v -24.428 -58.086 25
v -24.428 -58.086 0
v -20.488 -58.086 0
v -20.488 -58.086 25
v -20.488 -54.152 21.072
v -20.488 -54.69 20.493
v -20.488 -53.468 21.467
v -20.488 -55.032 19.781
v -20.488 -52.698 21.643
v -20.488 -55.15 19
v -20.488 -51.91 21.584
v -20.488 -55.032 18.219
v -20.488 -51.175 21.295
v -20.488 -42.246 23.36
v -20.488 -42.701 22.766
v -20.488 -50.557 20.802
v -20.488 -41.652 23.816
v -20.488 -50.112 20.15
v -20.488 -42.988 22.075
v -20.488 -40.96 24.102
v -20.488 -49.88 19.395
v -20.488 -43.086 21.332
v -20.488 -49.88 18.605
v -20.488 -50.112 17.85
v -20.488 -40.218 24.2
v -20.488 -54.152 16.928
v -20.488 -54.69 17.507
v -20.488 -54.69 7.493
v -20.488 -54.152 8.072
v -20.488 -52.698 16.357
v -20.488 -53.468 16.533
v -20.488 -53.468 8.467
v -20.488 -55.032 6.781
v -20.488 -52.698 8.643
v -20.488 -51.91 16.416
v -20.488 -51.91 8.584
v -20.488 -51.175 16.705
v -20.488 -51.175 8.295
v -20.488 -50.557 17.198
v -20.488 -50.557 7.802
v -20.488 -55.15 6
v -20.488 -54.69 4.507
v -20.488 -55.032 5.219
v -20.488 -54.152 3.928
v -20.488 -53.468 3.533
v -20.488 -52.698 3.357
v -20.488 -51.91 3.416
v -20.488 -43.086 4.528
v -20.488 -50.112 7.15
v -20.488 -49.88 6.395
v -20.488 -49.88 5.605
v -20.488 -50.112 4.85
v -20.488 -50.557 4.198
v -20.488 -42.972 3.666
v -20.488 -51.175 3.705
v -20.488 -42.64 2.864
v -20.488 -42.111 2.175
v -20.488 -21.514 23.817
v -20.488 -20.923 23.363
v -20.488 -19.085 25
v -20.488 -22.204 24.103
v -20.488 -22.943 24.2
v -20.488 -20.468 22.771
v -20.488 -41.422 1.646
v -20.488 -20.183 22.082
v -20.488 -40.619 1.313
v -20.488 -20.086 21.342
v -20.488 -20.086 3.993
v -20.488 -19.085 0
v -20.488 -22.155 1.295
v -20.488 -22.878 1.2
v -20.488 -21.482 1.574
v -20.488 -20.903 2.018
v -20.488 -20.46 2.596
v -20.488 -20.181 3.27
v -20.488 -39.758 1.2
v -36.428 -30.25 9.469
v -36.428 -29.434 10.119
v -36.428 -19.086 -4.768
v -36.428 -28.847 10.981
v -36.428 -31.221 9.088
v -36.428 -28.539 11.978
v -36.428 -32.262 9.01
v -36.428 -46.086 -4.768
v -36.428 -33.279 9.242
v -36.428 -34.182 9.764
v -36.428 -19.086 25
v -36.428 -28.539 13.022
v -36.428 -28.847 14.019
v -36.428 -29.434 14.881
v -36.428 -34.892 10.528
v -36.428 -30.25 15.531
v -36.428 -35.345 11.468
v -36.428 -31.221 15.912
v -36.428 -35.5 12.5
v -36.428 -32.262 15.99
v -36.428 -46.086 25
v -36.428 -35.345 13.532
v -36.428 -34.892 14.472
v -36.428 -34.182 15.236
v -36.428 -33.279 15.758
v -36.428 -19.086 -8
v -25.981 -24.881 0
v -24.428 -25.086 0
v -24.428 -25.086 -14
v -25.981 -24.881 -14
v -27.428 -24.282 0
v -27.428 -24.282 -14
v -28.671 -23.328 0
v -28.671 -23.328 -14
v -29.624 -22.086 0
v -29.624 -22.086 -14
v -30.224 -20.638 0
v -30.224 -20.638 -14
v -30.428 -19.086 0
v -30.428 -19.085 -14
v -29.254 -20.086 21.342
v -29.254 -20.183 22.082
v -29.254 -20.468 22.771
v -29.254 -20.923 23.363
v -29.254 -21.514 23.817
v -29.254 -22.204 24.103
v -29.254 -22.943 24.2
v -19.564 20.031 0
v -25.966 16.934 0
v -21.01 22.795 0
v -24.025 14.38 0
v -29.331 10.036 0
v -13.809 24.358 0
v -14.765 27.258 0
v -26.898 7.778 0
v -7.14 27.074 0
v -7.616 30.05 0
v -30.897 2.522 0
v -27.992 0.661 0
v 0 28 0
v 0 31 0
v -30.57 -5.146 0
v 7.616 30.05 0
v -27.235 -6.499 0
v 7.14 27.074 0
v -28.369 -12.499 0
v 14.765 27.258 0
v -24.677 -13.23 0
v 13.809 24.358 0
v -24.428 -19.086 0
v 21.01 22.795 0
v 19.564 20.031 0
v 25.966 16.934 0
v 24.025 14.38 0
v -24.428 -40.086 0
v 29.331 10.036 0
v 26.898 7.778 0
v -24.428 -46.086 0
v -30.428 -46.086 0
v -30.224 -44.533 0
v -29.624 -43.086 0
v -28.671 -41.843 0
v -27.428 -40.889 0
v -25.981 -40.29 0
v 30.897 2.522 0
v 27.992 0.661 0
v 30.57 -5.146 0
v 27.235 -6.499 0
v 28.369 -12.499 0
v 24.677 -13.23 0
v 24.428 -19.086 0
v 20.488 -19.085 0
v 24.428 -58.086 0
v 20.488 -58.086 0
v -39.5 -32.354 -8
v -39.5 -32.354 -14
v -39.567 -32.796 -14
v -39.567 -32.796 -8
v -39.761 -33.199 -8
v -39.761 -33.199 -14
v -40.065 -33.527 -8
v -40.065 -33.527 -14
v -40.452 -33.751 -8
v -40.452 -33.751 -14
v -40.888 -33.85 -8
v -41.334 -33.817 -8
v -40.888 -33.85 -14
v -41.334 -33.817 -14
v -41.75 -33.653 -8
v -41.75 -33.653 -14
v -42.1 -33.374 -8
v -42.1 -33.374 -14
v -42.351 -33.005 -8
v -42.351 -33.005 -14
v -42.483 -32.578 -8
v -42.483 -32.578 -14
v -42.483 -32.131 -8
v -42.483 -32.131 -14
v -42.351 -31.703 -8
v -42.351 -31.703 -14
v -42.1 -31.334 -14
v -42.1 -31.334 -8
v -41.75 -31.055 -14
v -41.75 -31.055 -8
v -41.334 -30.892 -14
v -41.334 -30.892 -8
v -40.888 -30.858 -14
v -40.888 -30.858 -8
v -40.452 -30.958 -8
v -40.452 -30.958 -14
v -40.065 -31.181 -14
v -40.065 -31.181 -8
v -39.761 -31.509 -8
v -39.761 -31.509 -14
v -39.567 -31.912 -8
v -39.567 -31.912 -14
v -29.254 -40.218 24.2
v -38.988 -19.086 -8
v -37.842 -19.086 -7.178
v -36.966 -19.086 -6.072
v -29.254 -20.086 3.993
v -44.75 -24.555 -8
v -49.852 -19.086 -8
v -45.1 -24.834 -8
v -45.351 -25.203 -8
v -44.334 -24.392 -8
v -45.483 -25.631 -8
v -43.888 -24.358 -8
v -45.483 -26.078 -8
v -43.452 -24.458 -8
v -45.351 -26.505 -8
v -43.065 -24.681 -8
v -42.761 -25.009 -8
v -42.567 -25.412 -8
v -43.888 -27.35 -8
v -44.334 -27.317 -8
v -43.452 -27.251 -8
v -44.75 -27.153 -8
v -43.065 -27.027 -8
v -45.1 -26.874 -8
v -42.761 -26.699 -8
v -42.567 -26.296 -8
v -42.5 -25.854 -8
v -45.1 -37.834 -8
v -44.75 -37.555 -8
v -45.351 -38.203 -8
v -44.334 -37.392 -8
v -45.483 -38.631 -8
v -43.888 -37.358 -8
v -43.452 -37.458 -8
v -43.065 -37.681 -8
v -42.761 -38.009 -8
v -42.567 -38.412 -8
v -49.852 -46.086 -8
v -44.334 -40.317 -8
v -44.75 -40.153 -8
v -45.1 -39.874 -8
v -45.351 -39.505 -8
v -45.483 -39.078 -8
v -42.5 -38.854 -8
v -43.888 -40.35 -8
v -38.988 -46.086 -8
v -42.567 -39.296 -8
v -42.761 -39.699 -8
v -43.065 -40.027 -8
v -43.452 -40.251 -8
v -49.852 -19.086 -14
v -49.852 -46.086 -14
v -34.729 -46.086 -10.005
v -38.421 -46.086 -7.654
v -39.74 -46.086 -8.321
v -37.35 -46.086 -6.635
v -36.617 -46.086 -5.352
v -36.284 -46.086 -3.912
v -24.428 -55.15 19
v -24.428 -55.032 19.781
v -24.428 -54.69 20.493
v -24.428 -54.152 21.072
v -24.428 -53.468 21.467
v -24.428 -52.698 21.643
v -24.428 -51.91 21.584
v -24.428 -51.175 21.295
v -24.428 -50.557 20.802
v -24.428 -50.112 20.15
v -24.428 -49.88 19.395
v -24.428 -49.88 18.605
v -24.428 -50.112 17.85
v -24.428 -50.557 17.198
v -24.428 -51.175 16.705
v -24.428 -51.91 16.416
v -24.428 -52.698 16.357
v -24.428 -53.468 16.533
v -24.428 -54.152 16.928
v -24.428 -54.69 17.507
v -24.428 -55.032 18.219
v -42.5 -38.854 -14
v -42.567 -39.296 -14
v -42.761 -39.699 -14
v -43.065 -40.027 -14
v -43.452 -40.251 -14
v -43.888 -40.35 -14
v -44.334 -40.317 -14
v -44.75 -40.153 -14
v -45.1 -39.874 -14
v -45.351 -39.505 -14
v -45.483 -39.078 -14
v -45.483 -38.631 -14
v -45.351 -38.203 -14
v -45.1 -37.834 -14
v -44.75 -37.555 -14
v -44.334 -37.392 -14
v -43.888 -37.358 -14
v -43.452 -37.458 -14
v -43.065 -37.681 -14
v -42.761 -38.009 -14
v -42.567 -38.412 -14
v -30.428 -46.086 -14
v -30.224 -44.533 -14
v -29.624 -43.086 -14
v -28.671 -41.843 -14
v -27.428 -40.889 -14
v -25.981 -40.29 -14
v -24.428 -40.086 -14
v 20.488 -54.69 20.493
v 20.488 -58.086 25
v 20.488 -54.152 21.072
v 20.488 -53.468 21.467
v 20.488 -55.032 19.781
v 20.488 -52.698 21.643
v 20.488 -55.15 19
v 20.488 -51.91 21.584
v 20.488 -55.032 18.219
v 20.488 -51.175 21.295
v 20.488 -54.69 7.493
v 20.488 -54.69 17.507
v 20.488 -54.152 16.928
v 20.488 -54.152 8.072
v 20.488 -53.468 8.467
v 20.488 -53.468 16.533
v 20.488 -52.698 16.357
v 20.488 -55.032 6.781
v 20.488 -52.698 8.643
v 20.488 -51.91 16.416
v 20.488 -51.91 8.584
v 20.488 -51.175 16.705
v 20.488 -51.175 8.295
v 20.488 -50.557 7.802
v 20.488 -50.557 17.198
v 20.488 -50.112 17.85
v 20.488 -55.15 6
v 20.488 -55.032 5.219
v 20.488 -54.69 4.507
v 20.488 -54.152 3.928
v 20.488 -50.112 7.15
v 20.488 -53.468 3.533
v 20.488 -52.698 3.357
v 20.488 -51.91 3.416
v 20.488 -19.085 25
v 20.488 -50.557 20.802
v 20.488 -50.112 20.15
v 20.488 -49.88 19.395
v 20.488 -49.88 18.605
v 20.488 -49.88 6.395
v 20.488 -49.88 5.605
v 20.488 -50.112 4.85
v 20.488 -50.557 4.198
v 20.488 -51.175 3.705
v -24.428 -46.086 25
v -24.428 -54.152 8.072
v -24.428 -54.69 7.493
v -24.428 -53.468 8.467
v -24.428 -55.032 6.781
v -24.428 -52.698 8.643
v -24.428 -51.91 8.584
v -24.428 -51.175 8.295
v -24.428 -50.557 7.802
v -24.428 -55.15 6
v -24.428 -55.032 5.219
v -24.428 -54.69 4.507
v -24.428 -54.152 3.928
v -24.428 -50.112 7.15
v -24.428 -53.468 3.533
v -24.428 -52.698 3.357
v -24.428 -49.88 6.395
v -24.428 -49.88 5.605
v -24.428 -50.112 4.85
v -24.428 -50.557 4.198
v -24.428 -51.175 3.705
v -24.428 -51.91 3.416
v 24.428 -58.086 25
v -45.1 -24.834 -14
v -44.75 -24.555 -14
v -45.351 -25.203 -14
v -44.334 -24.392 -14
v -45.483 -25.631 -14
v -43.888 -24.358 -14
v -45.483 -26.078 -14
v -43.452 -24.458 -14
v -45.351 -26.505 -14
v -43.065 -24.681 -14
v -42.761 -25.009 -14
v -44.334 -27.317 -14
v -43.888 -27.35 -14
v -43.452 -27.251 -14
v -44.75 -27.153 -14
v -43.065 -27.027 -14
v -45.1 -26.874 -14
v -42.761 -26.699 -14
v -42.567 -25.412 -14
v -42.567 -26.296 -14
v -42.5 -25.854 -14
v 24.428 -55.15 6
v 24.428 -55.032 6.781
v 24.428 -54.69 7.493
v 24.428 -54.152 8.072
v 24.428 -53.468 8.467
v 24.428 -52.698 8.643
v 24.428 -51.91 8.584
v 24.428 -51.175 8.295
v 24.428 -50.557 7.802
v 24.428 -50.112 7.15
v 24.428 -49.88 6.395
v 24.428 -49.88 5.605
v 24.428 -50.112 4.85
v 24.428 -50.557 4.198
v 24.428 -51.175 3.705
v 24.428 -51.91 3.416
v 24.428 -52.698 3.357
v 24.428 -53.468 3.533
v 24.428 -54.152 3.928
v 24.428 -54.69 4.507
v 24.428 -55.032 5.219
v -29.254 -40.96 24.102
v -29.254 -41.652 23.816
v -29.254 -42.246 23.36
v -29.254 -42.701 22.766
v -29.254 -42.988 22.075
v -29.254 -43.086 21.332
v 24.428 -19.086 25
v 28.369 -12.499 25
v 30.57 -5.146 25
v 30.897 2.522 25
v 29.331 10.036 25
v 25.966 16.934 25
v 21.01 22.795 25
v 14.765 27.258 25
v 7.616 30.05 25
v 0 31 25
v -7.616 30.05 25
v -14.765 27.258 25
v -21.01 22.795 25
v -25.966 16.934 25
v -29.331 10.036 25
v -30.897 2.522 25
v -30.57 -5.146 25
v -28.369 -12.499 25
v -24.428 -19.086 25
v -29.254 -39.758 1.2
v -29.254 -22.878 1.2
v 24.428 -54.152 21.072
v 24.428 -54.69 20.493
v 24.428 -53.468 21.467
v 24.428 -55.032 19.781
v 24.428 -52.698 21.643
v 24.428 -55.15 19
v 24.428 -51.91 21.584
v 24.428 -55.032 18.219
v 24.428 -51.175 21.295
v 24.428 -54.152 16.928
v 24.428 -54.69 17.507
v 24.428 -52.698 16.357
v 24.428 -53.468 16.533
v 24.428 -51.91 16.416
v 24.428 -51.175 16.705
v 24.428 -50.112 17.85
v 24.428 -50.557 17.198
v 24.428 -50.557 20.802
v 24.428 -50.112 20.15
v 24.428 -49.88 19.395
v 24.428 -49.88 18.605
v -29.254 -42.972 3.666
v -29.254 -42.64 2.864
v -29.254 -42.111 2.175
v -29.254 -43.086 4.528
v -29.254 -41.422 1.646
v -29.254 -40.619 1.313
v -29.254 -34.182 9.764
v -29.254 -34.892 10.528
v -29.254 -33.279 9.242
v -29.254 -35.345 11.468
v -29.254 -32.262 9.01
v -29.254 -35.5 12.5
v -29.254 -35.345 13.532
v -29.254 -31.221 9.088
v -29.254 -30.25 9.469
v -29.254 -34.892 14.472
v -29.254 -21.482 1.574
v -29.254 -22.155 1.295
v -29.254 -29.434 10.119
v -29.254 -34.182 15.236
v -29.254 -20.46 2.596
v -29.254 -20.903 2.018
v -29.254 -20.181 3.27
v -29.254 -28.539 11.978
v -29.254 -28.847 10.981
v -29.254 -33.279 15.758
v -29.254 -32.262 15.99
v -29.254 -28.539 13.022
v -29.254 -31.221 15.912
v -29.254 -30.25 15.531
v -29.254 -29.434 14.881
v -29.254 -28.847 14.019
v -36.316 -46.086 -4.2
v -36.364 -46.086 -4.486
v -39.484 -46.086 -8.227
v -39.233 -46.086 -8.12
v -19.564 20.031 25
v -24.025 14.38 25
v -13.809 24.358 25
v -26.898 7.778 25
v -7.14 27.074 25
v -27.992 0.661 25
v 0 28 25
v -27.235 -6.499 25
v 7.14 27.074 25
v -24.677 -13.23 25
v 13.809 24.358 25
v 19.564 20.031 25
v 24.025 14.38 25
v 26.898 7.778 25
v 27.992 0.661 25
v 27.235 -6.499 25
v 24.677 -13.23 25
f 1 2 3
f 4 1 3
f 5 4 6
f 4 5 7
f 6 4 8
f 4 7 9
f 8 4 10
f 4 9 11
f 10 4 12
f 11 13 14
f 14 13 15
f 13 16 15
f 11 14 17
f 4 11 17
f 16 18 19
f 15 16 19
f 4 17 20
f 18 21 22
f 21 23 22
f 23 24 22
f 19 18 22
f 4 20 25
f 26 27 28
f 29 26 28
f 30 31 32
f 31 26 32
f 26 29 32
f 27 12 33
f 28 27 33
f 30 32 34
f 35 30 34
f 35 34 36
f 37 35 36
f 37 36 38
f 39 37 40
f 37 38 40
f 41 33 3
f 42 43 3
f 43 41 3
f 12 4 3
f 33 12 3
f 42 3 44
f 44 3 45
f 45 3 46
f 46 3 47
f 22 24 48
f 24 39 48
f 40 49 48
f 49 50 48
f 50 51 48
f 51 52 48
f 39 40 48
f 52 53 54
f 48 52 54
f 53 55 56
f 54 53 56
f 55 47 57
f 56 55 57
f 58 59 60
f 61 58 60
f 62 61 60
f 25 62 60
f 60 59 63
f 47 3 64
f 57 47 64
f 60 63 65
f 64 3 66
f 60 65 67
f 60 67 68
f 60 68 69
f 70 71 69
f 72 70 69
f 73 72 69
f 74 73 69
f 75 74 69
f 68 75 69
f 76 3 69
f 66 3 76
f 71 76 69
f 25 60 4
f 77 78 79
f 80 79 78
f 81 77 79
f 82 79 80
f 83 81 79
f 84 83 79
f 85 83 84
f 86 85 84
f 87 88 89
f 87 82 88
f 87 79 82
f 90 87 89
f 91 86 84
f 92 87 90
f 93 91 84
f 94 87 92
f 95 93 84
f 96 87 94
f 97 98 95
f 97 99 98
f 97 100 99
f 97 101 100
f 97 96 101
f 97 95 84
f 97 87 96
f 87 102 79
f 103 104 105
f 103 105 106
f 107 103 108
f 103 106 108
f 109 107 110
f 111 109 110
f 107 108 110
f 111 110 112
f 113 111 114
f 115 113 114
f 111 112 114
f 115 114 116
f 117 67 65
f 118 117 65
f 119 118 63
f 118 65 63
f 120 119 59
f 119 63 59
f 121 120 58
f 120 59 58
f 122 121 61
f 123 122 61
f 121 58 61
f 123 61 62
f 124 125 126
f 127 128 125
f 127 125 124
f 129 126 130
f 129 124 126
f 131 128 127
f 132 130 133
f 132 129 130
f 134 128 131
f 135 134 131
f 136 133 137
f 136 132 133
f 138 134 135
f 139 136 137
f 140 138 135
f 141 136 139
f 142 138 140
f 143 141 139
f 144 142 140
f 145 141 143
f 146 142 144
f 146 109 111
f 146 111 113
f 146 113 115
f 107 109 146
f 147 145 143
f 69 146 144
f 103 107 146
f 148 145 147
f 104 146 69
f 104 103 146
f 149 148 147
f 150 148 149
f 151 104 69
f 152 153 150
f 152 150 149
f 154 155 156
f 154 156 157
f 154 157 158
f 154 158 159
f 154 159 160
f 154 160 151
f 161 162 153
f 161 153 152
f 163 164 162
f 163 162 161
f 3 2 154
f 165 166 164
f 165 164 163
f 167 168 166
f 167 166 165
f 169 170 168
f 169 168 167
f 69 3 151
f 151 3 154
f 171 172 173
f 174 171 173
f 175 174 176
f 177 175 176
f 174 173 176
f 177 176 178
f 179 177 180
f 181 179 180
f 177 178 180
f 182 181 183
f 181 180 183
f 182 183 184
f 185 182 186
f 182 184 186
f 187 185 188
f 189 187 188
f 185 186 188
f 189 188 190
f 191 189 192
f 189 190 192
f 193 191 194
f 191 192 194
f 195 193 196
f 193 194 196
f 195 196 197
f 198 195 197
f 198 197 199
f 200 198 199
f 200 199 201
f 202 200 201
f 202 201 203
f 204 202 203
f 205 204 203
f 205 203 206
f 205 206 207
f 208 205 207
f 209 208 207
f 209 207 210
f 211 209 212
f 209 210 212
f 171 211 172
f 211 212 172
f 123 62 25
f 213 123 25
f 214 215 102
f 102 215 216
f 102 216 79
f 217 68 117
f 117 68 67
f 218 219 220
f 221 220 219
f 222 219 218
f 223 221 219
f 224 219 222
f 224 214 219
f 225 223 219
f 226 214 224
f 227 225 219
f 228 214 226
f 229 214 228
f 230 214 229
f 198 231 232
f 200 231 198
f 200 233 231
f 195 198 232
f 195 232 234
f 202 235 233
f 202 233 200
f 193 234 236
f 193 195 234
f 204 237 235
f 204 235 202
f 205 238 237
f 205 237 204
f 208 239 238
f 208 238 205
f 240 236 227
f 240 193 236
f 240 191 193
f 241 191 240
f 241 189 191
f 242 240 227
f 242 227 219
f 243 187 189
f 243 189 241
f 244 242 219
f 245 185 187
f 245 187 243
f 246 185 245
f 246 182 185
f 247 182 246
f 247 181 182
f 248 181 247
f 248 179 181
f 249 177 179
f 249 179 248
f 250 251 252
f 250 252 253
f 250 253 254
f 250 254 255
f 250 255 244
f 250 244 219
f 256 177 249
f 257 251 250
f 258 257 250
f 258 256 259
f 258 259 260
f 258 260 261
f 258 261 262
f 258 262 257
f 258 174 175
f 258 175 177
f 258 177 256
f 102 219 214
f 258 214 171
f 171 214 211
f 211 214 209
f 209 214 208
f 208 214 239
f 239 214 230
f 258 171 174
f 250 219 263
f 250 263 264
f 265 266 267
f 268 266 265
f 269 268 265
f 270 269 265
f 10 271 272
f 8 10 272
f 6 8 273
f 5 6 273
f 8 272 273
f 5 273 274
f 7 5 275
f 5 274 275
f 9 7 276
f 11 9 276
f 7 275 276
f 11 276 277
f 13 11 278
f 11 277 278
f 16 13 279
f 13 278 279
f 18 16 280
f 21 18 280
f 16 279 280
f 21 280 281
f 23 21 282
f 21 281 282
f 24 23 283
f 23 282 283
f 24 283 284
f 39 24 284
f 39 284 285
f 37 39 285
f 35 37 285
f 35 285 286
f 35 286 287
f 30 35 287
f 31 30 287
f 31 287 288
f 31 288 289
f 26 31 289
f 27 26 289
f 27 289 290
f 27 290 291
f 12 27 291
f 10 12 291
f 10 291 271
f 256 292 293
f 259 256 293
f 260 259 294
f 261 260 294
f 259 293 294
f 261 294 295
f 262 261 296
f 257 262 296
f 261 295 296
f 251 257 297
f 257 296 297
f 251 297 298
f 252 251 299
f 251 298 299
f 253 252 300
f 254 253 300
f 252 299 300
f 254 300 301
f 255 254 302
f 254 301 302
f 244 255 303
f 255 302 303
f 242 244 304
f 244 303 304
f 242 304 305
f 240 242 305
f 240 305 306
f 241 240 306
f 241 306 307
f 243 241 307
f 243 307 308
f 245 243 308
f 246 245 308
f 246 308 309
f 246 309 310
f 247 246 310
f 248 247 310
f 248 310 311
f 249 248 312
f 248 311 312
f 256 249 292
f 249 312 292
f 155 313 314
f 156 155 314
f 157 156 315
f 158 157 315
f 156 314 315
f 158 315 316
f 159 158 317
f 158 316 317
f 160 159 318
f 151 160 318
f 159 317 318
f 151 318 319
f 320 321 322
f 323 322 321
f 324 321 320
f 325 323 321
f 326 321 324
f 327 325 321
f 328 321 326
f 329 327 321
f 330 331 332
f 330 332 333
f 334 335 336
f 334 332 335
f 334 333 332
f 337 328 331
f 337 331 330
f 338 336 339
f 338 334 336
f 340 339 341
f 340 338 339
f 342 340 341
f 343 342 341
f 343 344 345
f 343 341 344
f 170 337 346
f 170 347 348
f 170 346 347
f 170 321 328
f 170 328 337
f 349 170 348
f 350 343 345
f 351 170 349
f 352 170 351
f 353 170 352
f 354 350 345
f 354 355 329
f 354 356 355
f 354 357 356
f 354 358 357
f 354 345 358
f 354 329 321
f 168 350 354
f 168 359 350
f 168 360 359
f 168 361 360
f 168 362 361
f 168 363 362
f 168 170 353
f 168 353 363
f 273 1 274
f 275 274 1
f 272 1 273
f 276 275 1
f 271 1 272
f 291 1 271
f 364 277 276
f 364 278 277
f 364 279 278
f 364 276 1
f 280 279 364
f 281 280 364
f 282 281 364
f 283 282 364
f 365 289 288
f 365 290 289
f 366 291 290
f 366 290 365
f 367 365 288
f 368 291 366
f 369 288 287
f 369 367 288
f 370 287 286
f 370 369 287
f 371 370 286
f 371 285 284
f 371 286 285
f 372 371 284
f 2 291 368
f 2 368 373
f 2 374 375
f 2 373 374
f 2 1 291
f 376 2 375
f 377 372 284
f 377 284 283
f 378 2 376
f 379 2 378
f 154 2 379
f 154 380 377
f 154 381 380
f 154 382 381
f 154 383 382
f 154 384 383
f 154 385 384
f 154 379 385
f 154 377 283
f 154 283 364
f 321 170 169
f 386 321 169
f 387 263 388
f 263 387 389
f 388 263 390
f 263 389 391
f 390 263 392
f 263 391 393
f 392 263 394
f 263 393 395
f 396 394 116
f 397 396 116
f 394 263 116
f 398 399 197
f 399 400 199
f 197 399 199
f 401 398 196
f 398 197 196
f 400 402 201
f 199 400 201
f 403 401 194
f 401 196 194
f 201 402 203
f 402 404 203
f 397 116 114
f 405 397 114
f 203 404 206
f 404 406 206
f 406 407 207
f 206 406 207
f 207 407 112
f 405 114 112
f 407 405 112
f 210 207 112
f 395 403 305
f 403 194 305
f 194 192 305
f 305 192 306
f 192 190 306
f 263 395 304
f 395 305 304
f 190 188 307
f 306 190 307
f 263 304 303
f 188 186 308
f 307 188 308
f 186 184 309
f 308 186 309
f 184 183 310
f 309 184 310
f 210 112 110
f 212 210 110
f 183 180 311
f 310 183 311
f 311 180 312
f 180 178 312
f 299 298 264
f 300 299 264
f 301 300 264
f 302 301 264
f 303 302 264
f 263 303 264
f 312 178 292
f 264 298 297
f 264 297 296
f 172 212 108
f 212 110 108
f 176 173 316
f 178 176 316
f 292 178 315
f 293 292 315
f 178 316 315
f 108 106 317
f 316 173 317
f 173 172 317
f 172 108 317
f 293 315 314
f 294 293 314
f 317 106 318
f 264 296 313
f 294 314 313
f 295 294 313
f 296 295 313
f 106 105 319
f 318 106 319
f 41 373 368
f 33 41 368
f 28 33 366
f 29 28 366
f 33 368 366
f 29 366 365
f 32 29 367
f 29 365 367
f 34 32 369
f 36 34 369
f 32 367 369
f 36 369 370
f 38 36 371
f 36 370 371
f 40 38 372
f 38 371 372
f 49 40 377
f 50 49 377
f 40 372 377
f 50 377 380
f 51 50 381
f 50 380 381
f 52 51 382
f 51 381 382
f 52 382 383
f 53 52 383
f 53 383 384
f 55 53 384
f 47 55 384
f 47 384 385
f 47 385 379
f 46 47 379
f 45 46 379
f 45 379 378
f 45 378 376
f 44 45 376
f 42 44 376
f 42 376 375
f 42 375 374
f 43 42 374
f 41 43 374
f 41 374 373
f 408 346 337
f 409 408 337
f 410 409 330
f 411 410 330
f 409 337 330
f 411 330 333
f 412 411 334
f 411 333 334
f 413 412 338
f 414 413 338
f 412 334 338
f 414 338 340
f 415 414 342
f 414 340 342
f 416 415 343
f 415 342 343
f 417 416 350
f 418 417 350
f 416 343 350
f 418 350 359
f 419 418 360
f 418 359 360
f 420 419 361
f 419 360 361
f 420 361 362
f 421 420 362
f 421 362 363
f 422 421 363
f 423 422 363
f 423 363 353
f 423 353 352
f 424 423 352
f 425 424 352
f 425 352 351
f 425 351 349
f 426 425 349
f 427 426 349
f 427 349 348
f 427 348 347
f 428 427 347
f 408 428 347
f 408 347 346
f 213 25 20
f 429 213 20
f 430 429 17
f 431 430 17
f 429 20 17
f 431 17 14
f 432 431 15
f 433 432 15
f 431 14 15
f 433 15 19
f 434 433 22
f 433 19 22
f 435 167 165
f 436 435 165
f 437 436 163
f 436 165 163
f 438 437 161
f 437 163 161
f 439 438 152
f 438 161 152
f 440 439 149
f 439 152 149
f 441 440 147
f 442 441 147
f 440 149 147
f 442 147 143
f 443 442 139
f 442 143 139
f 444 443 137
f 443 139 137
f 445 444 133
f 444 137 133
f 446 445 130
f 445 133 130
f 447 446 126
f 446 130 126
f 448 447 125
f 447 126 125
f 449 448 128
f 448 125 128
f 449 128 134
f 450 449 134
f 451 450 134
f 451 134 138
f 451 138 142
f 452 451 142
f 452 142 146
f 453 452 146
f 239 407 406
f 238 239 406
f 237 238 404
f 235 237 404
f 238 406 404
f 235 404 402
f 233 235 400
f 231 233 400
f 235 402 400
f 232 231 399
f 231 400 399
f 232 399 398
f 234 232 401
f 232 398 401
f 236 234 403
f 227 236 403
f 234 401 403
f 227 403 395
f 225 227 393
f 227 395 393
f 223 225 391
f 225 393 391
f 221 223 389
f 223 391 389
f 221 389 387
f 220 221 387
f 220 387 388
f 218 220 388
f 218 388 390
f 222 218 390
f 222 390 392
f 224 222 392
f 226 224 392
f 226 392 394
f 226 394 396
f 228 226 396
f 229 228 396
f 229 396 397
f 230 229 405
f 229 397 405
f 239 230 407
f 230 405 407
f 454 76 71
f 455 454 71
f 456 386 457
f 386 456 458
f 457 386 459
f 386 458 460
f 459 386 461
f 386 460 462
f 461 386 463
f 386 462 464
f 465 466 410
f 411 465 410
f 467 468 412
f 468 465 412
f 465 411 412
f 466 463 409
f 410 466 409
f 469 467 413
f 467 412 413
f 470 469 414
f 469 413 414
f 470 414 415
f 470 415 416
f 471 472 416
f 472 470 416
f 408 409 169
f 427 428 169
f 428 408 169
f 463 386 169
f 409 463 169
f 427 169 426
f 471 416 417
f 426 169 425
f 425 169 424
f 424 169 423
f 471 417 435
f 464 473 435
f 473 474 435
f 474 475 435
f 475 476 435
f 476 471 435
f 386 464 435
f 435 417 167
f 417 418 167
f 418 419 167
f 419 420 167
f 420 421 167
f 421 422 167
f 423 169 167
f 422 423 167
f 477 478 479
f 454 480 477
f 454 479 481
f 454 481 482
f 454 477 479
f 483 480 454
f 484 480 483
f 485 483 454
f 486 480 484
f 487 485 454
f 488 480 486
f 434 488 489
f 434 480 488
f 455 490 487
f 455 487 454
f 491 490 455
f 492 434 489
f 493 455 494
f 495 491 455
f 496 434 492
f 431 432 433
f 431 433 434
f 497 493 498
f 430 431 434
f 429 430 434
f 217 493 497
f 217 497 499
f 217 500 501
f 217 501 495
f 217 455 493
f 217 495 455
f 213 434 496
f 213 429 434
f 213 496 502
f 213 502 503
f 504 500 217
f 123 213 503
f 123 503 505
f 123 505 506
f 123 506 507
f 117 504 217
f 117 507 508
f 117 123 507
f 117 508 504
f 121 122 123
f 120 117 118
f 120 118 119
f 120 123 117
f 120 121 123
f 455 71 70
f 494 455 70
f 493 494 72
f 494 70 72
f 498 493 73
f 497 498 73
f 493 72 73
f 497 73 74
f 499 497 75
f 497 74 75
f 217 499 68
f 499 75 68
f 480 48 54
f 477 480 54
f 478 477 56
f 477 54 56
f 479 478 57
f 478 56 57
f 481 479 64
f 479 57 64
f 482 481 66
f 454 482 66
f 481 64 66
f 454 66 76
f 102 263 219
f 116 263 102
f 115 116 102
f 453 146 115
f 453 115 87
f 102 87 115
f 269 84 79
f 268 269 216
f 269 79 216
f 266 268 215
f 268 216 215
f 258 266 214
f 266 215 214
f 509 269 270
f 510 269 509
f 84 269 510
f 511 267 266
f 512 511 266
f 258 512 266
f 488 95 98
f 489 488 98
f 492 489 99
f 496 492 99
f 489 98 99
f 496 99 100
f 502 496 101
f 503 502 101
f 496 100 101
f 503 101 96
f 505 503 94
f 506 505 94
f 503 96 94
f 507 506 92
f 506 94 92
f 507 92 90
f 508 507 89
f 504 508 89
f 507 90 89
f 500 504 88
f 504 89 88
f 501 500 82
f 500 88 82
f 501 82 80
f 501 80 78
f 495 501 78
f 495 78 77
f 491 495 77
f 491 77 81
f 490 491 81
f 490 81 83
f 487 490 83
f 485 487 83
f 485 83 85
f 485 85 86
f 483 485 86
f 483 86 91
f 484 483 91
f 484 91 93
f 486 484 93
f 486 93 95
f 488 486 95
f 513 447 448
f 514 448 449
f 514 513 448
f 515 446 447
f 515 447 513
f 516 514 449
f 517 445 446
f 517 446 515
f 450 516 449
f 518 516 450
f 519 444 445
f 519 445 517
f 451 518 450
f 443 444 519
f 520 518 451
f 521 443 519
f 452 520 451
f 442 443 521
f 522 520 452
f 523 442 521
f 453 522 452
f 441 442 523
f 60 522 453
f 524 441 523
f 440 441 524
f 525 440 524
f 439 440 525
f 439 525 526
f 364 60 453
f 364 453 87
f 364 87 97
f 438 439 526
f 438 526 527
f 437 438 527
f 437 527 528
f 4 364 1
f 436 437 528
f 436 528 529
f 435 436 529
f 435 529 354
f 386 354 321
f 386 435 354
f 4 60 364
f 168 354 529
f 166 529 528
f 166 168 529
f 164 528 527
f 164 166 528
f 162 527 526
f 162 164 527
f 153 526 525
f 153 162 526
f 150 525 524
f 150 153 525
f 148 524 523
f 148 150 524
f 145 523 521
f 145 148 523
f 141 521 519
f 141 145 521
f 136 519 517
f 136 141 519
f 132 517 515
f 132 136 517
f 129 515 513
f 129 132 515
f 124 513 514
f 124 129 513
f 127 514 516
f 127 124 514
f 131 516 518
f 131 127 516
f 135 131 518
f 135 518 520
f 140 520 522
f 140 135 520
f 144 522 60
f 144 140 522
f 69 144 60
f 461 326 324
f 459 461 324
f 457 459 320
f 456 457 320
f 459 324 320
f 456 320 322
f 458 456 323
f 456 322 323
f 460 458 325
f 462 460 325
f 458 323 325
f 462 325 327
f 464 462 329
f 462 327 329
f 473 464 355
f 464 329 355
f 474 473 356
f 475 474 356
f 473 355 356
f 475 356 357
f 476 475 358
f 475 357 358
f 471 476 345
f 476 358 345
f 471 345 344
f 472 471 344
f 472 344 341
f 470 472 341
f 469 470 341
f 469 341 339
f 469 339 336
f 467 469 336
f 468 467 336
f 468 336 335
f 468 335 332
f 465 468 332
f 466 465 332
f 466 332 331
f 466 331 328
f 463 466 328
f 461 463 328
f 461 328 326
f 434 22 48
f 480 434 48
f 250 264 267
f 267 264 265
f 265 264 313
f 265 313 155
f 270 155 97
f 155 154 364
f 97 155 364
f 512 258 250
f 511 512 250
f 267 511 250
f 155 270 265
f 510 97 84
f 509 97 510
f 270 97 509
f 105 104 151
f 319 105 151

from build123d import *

# Parameters (mm, degrees)
PAD079_DEPTH    = 25
SKETCH168_R     = 28
POCKET096_DEPTH = 25
SKETCH169_W     = 48.856676
SKETCH169_H     = 39
PAD080_DEPTH    = 25
SKETCH172_W     = 27
SKETCH172_H     = 39
PAD081_DEPTH    = 12
SKETCH175_W     = 27
SKETCH175_H     = 6
PAD082_DEPTH    = 15
SKETCH170_W     = 40.975294
SKETCH170_H     = 39
POCKET097_DEPTH = 25.001
PAD083_DEPTH    = 27
POCKET098_DEPTH = 9
SKETCH177_R     = 6
POCKET099_DEPTH = 14
SKETCH171_R     = 2.65
POCKET100_DEPTH = 55.429338
SKETCH174_R     = 3.5
POCKET101_DEPTH = 8
SKETCH176_R     = 1.5
POCKET102_DEPTH = 6


with BuildPart() as part:
    # Sketch167 → Pad079 (new body)
    with BuildSketch(Plane.XY):
        with BuildLine():
            ThreePointArc((24.428333, -19.085506), (0, 31), (-24.428333, -19.085506))
            Line((-24.428333, -19.085506), (24.428333, -19.085506))
        make_face()
    extrude(amount=PAD079_DEPTH)

    # Sketch168 → Pocket096 (cut)
    with BuildSketch(Plane.XY):
        Circle(SKETCH168_R)
    extrude(amount=POCKET096_DEPTH, mode=Mode.SUBTRACT)

    # Sketch169 → Pad080 (join)
    with BuildSketch(Plane.XY):
        with Locations((0, -38.5855)):
            Rectangle(SKETCH169_W, SKETCH169_H)
    extrude(amount=PAD080_DEPTH)

    # Sketch172 (on Face3 of Pad080) → Pad081 (join)
    with BuildSketch(Plane(origin=(-24.428338, 0, 0), x_dir=(0, -1, 0), z_dir=(-1, 0, 0))):
        with Locations((32.5855, 5.5)):
            Rectangle(SKETCH172_W, SKETCH172_H)
    extrude(amount=PAD081_DEPTH)

    # Sketch175 → Pad082 (join)
    with BuildSketch(Plane(origin=(-34.852298, 0, 0), x_dir=(0, -1, 0), z_dir=(-1, 0, 0))):
        with Locations((32.5855, -11)):
            Rectangle(SKETCH175_W, SKETCH175_H)
    extrude(amount=PAD082_DEPTH)

    # Sketch170 → Pocket097 (cut, through all)
    with BuildSketch(Plane.XY):
        with Locations((0, -38.5855)):
            Rectangle(SKETCH170_W, SKETCH170_H)
    extrude(amount=POCKET097_DEPTH, mode=Mode.SUBTRACT)

    # Sketch178 (on Face3 of Pocket097) → Pad083 (join)
    with BuildSketch(Plane(origin=(-2e-06, -19.085505, 0), x_dir=(-1, 0, 0), z_dir=(0, 1, 0))):
        with BuildLine():
            ThreePointArc((36.284298, -3.912067), (37.350001, -6.635466), (39.740093, -8.32072))
            Line((34.729457, -10.005197), (39.740093, -8.32072))
            Line((36.284298, -3.912067), (34.729457, -10.005197))
        make_face()
    extrude(amount=-PAD083_DEPTH)

    # Sketch173 → Pocket098 (cut)
    with BuildSketch(Plane(origin=(-20.254085, -4e-06, 0), x_dir=(0, 1, 0), z_dir=(1, 0, 0))):
        with BuildLine():
            Line((-43.0855, 21.332453), (-43.0855, 4.527547))
            ThreePointArc((-43.0855, 4.527547), (-42.110884, 2.174616), (-39.757953, 1.2))
            Line((-39.757953, 1.2), (-22.878191, 1.2))
            ThreePointArc((-22.878191, 1.2), (-20.90346, 2.01796), (-20.0855, 3.992691))
            Line((-20.0855, 3.992691), (-20.0855, 21.342255))
            ThreePointArc((-20.0855, 21.342255), (-20.922514, 23.362986), (-22.943245, 24.2))
            Line((-22.943245, 24.2), (-40.217953, 24.2))
            ThreePointArc((-40.217953, 24.2), (-42.245615, 23.360115), (-43.0855, 21.332453))
        make_face()
    extrude(amount=-POCKET098_DEPTH, mode=Mode.SUBTRACT)

    # Sketch177 → Pocket099 (cut)
    with BuildSketch(Plane(origin=(0, 0, -14), x_dir=(1, 0, 0), z_dir=(0, 0, -1))):
        with Locations((-24.428338, 46.0855)):
            Circle(SKETCH177_R)
        with Locations((-24.428338, 19.0855)):
            Circle(SKETCH177_R)
    extrude(amount=-POCKET099_DEPTH, mode=Mode.SUBTRACT)

    # Sketch171 (on Face12 of Pocket099) → Pocket100 (cut, through all)
    with BuildSketch(Plane(origin=(-24.428338, 0, 0), x_dir=(0, -1, 0), z_dir=(-1, 0, 0))):
        with Locations((52.5, 19)):
            Circle(SKETCH171_R)
        with Locations((52.5, 6)):
            Circle(SKETCH171_R)
    extrude(amount=-POCKET100_DEPTH, mode=Mode.SUBTRACT)

    # Sketch174 (on Face7 of Pocket100) → Pocket101 (cut)
    with BuildSketch(Plane(origin=(-36.428338, 0, 0), x_dir=(0, -1, 0), z_dir=(-1, 0, 0))):
        with Locations((32, 12.5)):
            Circle(SKETCH174_R)
    extrude(amount=-POCKET101_DEPTH, mode=Mode.SUBTRACT)

    # Sketch176 (on Face10 of Pocket101) → Pocket102 (cut)
    with BuildSketch(Plane(origin=(0, 0, -14), x_dir=(1, 0, 0), z_dir=(0, 0, -1))):
        with Locations((-44, 38.8542)):
            Circle(SKETCH176_R)
        with Locations((-44, 25.8542)):
            Circle(SKETCH176_R)
        with Locations((-41, 32.3542)):
            Circle(SKETCH176_R)
    extrude(amount=-POCKET102_DEPTH, mode=Mode.SUBTRACT)


solid = part.part
